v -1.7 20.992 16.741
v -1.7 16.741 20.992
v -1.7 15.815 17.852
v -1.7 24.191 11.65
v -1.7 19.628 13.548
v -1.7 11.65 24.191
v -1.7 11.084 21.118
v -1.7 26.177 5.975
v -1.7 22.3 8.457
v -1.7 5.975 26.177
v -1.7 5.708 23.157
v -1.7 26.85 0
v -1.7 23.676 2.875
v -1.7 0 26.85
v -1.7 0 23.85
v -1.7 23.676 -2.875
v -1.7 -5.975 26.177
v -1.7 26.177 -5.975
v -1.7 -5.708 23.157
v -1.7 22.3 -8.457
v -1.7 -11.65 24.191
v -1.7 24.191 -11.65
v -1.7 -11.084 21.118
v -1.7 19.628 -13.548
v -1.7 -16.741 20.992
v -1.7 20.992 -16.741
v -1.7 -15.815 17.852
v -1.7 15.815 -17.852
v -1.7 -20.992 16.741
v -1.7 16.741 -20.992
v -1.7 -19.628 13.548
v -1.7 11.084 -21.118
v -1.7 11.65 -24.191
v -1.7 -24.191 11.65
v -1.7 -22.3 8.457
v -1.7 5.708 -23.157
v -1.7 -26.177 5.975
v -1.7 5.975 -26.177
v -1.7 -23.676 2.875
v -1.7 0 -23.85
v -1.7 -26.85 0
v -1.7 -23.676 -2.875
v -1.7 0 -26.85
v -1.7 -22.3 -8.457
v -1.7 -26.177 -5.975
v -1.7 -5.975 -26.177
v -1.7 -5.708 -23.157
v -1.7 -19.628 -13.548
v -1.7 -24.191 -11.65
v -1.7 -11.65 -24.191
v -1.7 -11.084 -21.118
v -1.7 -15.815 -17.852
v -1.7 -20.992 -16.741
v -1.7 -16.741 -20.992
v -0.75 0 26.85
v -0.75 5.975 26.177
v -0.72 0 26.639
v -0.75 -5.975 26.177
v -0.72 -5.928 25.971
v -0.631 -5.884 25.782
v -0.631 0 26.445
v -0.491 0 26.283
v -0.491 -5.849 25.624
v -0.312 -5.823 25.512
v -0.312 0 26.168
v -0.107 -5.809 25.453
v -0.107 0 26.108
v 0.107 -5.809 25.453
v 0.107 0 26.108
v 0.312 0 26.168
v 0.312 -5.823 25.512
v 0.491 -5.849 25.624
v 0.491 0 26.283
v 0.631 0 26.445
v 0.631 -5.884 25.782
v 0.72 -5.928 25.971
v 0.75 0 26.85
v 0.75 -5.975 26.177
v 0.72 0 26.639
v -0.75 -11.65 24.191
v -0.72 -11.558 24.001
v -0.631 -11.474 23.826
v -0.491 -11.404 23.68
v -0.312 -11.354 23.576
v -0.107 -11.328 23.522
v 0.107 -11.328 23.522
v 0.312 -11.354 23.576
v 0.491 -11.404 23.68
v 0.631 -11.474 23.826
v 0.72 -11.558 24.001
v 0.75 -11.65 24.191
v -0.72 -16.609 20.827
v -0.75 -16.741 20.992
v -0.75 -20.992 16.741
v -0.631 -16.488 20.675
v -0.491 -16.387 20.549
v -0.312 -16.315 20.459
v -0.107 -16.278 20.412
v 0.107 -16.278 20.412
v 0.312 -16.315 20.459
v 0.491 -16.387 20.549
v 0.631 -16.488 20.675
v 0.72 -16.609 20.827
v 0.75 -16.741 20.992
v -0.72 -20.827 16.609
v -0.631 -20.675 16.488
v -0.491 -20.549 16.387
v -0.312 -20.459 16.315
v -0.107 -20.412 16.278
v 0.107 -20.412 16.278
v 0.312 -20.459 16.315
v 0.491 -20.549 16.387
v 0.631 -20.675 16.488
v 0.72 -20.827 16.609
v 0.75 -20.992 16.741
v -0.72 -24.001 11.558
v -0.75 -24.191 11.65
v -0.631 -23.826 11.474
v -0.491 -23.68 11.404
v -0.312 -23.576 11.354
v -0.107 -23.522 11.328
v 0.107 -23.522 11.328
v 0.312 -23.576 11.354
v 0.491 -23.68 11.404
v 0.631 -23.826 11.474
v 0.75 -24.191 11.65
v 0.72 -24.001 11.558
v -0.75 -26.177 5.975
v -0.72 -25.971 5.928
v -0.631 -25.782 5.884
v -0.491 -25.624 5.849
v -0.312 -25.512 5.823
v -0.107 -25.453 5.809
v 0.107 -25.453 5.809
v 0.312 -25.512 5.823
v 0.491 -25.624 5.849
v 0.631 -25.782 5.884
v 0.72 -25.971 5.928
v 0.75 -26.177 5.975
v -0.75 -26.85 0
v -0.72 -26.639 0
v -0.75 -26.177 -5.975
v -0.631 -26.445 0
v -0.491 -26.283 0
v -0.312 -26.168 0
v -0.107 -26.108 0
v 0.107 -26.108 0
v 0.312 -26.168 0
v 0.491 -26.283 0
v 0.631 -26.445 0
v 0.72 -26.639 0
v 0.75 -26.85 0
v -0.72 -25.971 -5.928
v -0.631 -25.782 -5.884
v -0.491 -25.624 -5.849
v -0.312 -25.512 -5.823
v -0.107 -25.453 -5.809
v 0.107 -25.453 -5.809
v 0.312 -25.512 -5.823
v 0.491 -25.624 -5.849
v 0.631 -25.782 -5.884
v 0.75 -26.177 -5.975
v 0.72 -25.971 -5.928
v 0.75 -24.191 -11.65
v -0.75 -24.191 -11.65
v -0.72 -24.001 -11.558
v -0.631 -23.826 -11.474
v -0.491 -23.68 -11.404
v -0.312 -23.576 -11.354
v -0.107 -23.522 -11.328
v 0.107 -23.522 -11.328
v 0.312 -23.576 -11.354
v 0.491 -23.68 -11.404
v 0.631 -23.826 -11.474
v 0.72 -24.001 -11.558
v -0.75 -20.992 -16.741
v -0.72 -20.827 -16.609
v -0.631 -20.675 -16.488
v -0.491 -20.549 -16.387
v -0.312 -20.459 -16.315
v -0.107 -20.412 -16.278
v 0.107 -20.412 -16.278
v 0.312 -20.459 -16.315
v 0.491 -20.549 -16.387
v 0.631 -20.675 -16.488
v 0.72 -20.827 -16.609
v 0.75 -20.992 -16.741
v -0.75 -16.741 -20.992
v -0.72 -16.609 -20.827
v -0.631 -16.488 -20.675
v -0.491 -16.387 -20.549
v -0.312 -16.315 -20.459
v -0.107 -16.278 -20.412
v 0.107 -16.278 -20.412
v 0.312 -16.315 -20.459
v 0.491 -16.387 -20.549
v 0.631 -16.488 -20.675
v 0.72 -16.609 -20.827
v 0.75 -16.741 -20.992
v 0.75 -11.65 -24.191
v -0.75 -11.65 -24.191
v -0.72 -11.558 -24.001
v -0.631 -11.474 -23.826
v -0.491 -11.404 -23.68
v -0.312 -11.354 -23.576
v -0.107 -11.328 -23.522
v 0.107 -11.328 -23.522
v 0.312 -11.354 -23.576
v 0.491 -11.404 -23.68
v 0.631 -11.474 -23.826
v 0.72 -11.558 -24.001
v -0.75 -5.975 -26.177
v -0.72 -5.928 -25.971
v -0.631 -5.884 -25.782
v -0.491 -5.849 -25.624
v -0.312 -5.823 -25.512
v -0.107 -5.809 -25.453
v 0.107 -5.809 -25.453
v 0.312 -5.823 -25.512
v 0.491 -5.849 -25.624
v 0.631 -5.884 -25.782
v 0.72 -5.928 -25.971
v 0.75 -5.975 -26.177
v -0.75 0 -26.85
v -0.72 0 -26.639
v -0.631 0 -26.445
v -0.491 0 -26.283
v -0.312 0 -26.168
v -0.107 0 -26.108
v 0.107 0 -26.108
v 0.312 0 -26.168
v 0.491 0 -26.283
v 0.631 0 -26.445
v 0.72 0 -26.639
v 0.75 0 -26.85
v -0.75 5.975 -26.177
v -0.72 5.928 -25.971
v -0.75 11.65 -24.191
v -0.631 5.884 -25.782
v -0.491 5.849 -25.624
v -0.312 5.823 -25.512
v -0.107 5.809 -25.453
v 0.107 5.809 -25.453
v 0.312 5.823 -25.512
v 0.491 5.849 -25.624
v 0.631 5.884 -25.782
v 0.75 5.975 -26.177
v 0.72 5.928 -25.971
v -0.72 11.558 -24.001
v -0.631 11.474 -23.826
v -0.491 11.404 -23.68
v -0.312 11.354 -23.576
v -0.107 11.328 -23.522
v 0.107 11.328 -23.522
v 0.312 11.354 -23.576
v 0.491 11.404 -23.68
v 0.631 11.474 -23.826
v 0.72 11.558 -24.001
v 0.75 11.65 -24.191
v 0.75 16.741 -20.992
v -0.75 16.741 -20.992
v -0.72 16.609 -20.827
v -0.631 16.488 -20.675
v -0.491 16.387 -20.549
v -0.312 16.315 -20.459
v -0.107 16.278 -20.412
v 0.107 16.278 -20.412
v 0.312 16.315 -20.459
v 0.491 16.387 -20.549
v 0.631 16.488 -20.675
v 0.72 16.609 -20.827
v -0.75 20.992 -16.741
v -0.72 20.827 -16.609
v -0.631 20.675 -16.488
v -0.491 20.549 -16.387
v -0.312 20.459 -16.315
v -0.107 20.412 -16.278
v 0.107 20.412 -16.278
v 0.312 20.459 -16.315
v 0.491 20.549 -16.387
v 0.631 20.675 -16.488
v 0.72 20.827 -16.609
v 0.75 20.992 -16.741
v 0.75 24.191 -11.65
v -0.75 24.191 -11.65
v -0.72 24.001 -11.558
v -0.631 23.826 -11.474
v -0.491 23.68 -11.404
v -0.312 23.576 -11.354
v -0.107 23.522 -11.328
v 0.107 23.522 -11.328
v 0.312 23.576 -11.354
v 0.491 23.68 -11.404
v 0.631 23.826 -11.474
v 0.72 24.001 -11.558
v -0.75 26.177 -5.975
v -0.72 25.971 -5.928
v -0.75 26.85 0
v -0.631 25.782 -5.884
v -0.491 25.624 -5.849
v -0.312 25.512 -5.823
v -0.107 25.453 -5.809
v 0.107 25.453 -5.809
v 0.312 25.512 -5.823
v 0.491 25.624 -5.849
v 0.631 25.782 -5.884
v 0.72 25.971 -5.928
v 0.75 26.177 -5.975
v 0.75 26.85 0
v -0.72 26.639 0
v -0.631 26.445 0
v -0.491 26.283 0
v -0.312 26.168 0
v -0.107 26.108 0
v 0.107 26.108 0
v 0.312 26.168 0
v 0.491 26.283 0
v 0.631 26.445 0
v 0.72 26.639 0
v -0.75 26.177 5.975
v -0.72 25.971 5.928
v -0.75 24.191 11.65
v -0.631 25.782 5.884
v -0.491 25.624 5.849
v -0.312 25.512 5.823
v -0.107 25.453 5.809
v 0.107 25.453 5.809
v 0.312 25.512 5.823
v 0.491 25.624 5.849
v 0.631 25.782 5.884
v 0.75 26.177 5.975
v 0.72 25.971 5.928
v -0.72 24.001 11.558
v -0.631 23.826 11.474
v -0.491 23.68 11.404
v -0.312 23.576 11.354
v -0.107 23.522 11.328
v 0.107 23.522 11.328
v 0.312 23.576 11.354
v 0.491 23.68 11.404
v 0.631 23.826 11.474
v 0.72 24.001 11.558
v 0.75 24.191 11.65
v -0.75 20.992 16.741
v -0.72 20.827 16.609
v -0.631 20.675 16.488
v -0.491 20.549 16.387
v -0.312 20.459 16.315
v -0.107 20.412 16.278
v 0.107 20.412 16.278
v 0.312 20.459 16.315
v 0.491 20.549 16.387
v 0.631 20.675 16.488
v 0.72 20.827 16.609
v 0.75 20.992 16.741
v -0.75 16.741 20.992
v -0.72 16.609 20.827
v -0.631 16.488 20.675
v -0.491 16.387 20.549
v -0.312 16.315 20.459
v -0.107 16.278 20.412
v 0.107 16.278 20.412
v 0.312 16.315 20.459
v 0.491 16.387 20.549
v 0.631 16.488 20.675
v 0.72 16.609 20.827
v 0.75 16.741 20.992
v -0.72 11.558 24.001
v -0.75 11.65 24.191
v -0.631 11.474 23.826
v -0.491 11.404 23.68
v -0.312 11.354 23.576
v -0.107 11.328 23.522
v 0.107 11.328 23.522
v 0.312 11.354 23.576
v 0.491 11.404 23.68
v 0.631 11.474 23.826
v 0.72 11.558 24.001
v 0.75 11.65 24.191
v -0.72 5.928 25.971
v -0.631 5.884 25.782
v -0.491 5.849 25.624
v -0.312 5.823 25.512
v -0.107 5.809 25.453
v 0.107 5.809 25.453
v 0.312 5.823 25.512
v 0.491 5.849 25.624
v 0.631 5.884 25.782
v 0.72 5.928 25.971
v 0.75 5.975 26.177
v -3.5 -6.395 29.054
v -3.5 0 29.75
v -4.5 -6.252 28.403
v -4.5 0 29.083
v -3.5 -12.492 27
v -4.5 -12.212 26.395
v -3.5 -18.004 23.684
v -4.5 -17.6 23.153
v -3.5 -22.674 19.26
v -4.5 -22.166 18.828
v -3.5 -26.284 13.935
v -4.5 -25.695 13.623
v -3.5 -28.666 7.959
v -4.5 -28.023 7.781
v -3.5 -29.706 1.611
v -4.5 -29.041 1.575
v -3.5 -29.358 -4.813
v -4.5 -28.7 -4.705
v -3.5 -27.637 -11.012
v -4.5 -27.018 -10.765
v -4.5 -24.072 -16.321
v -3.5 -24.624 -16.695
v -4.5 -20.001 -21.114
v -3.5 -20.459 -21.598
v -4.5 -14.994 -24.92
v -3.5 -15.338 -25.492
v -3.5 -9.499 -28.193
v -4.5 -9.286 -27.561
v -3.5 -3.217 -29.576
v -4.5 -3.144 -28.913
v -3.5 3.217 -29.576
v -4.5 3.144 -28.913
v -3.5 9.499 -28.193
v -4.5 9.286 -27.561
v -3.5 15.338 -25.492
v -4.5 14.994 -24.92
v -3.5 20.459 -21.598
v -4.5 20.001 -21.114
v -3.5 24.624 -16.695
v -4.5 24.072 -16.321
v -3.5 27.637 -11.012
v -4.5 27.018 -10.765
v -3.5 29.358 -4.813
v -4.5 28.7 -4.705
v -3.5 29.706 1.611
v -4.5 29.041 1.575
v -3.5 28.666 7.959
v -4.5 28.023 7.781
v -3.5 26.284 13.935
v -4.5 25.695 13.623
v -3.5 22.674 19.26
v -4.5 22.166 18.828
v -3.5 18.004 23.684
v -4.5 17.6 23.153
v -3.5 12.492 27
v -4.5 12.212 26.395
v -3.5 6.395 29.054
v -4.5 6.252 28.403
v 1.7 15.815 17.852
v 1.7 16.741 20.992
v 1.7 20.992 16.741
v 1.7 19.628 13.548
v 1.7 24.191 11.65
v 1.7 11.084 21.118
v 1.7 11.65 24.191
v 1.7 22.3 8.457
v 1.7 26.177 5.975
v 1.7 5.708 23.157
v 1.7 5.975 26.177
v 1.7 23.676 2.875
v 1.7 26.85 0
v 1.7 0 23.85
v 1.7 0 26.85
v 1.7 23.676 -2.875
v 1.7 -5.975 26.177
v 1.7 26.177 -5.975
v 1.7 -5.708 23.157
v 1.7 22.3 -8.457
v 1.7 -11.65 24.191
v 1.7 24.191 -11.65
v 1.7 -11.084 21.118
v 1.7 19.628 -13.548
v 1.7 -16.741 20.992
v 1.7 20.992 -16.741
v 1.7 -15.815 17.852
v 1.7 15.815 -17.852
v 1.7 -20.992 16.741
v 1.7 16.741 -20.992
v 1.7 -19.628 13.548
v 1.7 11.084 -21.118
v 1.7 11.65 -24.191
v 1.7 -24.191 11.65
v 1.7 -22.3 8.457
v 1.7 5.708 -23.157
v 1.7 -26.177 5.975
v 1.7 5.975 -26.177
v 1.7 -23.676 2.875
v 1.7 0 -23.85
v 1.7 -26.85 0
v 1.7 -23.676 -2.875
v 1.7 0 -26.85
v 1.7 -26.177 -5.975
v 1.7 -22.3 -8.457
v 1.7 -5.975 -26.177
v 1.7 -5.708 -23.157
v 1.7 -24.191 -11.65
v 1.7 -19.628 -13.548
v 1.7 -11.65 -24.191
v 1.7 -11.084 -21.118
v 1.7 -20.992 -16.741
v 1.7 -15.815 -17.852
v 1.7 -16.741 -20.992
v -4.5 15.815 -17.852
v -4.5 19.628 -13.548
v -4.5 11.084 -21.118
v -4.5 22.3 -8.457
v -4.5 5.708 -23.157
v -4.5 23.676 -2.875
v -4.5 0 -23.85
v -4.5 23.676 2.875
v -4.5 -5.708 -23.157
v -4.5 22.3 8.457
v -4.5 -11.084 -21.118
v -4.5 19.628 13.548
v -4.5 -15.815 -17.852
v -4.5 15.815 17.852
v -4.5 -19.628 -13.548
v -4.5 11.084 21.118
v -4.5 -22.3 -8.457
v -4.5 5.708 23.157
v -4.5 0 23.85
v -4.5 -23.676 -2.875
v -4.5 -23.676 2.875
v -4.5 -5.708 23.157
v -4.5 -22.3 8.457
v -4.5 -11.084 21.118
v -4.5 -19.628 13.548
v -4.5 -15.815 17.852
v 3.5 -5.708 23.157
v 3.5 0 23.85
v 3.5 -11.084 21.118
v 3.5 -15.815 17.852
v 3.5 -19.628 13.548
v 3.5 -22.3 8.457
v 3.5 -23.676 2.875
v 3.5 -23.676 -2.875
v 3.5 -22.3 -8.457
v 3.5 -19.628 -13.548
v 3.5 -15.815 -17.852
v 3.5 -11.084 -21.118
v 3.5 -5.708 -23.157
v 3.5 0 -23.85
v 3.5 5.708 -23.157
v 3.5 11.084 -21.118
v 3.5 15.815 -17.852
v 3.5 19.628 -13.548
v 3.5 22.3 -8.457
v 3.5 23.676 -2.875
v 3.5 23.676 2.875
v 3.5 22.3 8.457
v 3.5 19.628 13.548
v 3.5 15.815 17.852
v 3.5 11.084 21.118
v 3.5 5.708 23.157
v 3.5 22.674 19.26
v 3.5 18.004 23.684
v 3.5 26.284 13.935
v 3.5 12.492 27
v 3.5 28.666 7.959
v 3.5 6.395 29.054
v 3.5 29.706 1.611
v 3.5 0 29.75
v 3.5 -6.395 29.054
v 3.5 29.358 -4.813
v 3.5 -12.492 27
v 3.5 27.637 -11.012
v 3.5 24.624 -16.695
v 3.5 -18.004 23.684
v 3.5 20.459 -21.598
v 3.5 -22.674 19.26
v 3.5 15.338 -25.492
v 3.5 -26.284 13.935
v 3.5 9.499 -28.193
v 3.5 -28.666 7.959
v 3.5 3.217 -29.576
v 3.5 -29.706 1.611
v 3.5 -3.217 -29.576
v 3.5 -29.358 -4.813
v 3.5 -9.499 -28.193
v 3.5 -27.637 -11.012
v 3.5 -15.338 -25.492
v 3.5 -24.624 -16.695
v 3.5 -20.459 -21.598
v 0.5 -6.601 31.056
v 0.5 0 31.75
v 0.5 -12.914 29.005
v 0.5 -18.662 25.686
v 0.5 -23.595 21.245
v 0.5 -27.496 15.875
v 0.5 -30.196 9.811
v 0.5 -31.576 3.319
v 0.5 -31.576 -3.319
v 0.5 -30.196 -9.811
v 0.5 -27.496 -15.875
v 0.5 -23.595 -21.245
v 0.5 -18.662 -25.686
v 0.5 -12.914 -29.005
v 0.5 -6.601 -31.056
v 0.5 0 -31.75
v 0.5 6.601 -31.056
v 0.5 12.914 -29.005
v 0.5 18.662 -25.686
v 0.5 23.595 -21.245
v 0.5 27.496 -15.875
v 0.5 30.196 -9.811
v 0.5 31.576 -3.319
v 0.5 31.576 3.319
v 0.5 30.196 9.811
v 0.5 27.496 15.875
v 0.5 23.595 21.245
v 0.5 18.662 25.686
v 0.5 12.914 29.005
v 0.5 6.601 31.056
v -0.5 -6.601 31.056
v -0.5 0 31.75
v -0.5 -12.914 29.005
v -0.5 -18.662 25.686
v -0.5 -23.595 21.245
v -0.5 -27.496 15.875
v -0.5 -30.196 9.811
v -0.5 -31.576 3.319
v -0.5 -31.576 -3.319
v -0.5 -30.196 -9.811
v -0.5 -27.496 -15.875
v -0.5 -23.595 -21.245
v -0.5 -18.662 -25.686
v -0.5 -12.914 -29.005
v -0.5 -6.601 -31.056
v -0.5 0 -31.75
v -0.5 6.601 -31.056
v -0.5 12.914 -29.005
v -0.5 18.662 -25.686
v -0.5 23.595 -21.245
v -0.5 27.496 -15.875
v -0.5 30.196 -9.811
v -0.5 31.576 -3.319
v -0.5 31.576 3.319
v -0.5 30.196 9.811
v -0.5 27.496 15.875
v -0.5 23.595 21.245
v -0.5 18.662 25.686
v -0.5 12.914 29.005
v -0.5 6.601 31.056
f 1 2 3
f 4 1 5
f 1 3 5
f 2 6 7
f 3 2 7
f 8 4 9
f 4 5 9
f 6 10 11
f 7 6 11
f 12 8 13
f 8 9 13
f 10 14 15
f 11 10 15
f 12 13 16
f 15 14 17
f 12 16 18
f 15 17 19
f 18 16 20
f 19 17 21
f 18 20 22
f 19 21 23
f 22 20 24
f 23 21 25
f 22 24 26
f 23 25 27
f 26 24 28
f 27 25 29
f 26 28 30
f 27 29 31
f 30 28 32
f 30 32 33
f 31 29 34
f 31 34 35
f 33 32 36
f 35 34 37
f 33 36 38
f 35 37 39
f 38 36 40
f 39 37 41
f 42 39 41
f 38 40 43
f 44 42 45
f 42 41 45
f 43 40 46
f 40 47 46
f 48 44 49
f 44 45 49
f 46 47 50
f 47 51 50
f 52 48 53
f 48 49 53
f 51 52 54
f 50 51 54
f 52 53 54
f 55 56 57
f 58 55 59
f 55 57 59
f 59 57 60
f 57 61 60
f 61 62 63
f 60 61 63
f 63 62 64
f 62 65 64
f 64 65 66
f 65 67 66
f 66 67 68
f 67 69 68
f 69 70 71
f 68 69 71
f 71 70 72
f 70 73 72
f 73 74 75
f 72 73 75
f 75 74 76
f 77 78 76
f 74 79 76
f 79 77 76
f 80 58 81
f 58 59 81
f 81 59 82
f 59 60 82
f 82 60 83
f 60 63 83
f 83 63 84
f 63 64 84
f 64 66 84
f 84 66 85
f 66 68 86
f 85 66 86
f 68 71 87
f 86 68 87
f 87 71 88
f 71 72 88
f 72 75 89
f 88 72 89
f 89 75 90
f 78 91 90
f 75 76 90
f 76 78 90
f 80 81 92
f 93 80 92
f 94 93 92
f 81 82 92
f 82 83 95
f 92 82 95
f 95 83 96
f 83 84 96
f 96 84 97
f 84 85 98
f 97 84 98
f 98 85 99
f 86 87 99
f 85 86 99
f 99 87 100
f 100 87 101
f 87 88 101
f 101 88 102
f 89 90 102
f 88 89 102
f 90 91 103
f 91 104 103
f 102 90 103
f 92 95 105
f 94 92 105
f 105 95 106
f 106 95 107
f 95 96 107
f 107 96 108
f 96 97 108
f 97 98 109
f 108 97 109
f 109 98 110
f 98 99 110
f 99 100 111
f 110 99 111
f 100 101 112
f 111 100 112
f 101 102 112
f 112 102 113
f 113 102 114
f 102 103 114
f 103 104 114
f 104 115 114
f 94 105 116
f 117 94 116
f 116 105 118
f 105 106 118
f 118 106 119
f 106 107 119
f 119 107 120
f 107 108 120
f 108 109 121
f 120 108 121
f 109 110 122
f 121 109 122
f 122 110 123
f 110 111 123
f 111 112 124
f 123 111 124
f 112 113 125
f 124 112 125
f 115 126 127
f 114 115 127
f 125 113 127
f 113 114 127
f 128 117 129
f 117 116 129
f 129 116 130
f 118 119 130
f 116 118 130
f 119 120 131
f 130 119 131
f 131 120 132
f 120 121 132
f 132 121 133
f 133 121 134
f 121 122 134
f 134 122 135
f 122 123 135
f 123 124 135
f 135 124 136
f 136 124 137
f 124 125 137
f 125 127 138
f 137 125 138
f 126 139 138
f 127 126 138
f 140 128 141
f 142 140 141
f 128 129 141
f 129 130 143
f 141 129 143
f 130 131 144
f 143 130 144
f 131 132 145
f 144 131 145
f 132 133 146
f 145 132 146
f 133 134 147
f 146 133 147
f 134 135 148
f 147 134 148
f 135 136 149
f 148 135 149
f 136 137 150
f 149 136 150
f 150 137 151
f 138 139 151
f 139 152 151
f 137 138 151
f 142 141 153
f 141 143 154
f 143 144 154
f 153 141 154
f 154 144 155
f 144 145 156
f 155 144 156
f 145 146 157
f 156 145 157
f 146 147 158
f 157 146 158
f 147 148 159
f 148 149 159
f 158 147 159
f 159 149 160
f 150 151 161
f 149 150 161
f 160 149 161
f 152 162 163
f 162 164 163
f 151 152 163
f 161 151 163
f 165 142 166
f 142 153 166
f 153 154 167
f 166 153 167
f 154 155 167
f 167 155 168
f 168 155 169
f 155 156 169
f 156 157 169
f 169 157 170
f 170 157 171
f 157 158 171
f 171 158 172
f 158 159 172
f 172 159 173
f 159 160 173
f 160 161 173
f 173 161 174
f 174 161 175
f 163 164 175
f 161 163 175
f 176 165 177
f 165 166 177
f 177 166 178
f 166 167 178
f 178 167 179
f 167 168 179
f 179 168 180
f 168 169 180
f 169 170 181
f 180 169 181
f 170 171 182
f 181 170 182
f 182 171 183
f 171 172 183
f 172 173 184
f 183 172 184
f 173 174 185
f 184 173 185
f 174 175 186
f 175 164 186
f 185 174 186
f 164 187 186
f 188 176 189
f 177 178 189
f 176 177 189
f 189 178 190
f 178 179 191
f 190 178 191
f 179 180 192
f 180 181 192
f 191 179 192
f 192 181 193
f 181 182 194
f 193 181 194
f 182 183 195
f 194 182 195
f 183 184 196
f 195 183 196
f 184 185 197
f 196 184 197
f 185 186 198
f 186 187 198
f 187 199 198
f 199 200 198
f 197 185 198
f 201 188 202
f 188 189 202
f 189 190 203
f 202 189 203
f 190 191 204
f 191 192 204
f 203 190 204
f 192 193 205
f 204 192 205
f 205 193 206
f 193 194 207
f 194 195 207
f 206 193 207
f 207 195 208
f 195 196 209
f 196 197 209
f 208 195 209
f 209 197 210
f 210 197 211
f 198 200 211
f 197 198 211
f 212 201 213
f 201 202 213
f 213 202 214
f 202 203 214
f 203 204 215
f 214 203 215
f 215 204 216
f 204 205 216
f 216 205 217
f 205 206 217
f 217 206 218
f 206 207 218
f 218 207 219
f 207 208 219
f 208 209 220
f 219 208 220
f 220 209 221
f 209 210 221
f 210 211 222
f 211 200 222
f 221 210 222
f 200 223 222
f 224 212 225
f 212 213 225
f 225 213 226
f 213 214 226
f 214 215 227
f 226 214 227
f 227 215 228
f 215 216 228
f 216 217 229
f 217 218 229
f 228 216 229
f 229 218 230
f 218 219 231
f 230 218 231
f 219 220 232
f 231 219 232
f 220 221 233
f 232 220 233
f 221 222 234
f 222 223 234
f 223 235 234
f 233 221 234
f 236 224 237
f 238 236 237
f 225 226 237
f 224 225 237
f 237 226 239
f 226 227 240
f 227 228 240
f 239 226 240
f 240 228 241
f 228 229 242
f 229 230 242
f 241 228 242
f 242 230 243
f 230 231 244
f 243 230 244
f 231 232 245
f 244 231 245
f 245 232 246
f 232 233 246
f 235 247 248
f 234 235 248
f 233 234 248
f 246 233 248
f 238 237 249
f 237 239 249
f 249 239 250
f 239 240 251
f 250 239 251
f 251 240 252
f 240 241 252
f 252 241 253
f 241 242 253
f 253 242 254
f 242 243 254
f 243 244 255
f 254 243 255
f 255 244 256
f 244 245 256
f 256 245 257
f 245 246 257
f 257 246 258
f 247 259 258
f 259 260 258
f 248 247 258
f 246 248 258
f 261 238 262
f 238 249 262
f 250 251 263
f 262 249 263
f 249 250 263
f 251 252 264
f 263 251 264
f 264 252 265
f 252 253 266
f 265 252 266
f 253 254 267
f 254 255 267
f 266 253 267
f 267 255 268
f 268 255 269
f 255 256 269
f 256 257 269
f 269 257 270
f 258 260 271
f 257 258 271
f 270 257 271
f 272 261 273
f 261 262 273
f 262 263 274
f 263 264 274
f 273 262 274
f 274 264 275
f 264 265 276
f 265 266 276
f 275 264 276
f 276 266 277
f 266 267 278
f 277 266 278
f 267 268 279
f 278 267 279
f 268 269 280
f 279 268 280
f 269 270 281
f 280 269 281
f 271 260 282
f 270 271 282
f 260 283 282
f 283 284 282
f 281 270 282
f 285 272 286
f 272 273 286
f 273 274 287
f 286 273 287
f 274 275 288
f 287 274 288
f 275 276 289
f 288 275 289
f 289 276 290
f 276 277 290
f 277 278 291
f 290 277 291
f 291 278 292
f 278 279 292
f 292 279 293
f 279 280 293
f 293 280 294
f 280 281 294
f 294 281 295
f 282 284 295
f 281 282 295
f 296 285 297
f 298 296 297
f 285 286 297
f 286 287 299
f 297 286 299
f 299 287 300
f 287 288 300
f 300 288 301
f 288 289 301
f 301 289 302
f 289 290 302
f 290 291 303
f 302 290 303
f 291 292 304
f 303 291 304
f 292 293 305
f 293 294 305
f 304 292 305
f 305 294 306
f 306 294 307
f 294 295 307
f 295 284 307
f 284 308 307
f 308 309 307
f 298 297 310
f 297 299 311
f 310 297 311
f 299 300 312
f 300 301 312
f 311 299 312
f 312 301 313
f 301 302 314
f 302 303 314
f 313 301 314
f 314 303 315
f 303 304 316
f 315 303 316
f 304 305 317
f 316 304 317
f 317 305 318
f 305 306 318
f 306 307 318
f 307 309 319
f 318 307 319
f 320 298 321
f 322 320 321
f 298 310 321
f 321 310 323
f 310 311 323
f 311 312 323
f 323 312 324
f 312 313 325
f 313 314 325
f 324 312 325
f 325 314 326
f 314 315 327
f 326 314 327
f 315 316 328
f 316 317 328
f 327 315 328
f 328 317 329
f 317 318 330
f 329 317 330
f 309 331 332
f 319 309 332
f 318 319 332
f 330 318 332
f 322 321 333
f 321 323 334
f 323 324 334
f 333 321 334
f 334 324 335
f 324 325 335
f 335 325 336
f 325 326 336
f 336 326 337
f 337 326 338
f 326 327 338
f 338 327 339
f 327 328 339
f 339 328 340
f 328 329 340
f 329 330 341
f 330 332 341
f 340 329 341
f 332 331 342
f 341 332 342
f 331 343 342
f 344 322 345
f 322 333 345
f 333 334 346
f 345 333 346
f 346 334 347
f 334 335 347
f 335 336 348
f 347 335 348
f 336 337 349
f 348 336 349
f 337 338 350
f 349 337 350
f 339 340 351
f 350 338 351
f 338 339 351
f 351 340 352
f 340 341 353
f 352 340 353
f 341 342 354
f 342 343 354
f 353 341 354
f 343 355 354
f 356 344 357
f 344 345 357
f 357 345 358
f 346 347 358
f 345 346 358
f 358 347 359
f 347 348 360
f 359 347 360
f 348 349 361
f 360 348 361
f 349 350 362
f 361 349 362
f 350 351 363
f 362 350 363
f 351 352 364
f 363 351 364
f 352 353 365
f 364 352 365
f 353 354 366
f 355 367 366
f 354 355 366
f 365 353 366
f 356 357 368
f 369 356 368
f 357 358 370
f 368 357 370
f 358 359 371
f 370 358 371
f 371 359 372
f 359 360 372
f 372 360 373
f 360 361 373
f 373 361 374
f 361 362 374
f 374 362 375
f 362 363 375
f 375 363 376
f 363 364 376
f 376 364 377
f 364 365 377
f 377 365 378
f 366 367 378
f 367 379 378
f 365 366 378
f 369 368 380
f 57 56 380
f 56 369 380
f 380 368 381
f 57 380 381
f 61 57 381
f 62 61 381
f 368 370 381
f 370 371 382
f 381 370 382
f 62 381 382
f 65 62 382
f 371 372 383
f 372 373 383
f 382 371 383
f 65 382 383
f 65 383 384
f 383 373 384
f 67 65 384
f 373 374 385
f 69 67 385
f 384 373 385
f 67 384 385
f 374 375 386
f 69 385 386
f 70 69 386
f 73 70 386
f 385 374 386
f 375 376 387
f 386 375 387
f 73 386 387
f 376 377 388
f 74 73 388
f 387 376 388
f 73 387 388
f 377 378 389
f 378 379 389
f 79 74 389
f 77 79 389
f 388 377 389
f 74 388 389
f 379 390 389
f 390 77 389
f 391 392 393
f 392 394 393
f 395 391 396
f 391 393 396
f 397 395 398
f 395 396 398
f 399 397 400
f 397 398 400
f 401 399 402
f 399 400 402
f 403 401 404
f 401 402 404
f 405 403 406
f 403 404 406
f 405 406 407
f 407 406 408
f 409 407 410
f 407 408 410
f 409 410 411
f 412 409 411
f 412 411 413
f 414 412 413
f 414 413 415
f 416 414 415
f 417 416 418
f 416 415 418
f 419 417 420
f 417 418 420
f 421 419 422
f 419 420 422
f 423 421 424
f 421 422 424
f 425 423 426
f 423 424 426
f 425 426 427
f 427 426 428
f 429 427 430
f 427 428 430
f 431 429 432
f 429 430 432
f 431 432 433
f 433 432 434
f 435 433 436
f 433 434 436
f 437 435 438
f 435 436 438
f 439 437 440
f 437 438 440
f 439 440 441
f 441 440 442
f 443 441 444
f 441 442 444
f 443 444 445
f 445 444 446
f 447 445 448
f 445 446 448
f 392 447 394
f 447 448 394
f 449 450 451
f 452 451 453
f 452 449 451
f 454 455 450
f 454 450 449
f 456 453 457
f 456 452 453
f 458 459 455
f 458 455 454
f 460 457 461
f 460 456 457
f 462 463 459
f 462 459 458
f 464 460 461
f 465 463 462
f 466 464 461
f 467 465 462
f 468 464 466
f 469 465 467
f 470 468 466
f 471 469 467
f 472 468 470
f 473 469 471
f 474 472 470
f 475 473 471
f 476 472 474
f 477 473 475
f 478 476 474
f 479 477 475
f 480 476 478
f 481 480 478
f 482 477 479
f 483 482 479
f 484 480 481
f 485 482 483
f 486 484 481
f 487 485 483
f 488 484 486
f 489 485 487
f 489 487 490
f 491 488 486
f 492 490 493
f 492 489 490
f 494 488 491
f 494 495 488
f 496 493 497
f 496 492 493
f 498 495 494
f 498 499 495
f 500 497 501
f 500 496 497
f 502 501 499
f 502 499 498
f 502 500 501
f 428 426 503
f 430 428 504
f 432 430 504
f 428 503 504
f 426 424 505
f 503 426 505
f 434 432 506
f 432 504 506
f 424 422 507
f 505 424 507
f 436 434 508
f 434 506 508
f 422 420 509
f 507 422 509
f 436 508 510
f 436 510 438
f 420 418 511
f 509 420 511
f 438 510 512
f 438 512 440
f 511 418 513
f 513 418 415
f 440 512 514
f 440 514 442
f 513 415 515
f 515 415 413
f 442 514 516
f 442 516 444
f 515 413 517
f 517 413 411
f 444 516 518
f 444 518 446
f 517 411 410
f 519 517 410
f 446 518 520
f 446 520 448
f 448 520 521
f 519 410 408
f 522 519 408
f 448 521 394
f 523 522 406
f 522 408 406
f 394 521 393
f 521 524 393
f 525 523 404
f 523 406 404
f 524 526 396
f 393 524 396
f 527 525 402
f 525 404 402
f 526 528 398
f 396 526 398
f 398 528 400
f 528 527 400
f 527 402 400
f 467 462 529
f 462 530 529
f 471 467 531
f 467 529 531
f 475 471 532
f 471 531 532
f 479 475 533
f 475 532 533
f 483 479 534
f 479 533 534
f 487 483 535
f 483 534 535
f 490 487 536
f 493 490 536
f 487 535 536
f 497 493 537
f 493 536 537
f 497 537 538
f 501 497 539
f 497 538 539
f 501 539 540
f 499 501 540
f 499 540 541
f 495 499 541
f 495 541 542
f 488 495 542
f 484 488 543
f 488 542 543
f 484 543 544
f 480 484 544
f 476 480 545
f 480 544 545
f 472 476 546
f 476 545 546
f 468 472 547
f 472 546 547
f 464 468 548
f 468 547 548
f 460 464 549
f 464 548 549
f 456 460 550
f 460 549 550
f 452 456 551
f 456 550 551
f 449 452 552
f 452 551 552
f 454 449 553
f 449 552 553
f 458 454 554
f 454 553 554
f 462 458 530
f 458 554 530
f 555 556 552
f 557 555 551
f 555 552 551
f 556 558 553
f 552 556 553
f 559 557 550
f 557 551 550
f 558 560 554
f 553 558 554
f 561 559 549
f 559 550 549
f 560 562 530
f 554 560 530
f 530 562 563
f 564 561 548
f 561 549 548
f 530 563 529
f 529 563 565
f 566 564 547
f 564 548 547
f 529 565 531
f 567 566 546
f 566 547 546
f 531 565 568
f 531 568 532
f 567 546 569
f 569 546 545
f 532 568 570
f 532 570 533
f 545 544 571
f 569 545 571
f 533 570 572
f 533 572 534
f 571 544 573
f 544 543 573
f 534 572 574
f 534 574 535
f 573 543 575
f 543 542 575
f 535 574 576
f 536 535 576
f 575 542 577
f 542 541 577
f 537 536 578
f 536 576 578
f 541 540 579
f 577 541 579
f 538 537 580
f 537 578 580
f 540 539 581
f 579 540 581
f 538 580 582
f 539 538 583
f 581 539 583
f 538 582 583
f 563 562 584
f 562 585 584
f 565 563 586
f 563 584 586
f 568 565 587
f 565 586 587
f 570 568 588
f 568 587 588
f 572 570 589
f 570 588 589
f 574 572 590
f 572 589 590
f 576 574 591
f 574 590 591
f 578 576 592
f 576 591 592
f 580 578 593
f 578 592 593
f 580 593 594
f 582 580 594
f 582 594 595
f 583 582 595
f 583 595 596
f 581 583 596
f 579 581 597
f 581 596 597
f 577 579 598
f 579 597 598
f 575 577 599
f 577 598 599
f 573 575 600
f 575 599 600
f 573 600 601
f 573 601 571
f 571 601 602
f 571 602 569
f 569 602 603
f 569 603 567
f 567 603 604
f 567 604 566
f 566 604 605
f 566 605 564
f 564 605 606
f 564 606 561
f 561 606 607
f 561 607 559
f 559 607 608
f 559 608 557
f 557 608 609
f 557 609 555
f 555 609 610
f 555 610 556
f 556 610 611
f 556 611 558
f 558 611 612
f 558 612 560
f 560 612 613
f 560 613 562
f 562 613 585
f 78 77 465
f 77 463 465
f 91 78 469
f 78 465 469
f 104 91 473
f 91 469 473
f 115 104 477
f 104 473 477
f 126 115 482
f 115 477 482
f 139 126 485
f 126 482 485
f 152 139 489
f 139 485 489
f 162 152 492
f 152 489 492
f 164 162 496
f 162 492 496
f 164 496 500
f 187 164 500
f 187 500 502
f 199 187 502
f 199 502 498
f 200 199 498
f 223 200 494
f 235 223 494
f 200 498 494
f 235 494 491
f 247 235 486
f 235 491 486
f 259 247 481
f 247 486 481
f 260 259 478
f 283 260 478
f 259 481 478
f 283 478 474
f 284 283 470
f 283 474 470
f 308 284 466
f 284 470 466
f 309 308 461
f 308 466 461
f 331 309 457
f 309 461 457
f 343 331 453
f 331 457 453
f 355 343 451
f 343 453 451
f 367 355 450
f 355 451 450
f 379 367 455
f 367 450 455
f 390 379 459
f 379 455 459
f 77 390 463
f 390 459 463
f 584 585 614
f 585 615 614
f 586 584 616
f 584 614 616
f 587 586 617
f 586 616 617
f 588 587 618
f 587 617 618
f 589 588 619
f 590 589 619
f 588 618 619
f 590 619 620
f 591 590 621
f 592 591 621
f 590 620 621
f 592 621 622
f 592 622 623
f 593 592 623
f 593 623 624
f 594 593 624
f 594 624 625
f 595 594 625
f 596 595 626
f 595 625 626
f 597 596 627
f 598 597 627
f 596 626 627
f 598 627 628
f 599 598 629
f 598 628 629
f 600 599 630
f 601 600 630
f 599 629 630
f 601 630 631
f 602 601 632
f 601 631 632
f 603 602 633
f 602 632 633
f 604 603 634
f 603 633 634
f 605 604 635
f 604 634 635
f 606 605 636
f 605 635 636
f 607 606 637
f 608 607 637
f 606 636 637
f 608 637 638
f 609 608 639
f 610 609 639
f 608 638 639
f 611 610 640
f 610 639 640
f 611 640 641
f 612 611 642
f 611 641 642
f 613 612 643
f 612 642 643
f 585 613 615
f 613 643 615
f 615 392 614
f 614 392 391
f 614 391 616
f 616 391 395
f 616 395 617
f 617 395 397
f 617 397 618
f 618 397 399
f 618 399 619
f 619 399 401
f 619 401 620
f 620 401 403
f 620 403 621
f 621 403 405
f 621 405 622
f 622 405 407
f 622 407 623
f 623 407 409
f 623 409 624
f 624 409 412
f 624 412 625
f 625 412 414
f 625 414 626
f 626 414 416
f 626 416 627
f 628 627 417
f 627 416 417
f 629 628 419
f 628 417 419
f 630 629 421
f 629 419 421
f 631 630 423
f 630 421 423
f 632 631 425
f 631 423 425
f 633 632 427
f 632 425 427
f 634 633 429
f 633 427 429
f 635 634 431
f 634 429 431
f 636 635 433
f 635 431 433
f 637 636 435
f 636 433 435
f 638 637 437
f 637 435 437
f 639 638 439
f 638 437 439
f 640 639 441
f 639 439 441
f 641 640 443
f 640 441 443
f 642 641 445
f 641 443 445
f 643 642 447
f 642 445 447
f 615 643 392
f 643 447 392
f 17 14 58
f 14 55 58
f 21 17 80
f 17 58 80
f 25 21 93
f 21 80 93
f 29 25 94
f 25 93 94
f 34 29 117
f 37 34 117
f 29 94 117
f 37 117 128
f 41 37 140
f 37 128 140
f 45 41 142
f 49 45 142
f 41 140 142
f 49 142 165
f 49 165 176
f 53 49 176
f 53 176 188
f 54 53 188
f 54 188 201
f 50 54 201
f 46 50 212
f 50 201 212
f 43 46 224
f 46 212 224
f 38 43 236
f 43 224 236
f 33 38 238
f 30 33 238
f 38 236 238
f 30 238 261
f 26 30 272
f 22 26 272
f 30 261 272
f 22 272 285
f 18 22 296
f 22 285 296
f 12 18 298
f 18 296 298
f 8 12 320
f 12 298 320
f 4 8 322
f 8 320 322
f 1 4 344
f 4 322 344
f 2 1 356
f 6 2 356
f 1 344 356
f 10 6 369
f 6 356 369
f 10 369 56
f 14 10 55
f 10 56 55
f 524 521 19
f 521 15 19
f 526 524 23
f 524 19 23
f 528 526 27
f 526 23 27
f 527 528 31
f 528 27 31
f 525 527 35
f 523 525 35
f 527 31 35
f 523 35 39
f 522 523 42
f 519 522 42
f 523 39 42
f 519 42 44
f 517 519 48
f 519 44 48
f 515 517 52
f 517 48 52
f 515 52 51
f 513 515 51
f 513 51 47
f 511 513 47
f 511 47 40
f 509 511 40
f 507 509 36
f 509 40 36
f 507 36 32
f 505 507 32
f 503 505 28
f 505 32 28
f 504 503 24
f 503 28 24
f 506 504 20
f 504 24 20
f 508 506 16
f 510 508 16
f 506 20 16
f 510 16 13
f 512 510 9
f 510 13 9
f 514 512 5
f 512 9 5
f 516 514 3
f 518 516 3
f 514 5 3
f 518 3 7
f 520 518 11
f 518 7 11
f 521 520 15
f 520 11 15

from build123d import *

# Parameters (mm, degrees)
SKETCH_1_R = 0.75
SKETCH_1_W = 1.8
SKETCH_1_H = 3


with BuildPart() as part:
    # Эскиз1 → Повернуть1 (revolve)
    with BuildSketch(Plane(origin=(0, 0, 0), x_dir=(1, 0, 0), z_dir=(0, 1, 0)), mode=Mode.PRIVATE) as revolve_1_sk:
        with Locations((0, 26.85)):
            Circle(SKETCH_1_R)
        Polygon((-3.5, 26.85), (3.5, 26.85), (3.5, 29.75), (0.5, 31.75), (-0.5, 31.75), (-3.5, 29.75), align=None)
        with BuildLine():
            Line((-0.75, 26.85), (0, 26.85))
            Line((0, 26.85), (0.75, 26.85))
            ThreePointArc((0.75, 26.85), (0, 27.6), (-0.75, 26.85))
        make_face()
        with BuildLine():
            ThreePointArc((-0.75, 26.85), (-0.530330086, 26.319669914), (0, 26.1))
            Line((0, 26.1), (0, 26.85))
            Line((0, 26.85), (-0.75, 26.85))
        make_face()
        with BuildLine():
            Line((0, 26.85), (0, 26.1))
            ThreePointArc((0, 26.1), (0.530330086, 26.319669914), (0.75, 26.85))
            Line((0.75, 26.85), (0, 26.85))
        make_face()
        Polygon((-4.5, 29.083333333), (-4.5, 23.85), (-3.5, 23.85), (-3.5, 26.85), (-3.5, 29.75), align=None)
        with Locations((-2.6, 25.35)):
            Rectangle(SKETCH_1_W, SKETCH_1_H)
        with Locations((2.6, 25.35)):
            Rectangle(SKETCH_1_W, SKETCH_1_H)
    revolve(revolve_1_sk.sketch.rotate(Axis((0, 0, 0), (1, 0, 0)), 180), axis=Axis((0, 0, 0), (1, 0, 0)))


solid = part.part
